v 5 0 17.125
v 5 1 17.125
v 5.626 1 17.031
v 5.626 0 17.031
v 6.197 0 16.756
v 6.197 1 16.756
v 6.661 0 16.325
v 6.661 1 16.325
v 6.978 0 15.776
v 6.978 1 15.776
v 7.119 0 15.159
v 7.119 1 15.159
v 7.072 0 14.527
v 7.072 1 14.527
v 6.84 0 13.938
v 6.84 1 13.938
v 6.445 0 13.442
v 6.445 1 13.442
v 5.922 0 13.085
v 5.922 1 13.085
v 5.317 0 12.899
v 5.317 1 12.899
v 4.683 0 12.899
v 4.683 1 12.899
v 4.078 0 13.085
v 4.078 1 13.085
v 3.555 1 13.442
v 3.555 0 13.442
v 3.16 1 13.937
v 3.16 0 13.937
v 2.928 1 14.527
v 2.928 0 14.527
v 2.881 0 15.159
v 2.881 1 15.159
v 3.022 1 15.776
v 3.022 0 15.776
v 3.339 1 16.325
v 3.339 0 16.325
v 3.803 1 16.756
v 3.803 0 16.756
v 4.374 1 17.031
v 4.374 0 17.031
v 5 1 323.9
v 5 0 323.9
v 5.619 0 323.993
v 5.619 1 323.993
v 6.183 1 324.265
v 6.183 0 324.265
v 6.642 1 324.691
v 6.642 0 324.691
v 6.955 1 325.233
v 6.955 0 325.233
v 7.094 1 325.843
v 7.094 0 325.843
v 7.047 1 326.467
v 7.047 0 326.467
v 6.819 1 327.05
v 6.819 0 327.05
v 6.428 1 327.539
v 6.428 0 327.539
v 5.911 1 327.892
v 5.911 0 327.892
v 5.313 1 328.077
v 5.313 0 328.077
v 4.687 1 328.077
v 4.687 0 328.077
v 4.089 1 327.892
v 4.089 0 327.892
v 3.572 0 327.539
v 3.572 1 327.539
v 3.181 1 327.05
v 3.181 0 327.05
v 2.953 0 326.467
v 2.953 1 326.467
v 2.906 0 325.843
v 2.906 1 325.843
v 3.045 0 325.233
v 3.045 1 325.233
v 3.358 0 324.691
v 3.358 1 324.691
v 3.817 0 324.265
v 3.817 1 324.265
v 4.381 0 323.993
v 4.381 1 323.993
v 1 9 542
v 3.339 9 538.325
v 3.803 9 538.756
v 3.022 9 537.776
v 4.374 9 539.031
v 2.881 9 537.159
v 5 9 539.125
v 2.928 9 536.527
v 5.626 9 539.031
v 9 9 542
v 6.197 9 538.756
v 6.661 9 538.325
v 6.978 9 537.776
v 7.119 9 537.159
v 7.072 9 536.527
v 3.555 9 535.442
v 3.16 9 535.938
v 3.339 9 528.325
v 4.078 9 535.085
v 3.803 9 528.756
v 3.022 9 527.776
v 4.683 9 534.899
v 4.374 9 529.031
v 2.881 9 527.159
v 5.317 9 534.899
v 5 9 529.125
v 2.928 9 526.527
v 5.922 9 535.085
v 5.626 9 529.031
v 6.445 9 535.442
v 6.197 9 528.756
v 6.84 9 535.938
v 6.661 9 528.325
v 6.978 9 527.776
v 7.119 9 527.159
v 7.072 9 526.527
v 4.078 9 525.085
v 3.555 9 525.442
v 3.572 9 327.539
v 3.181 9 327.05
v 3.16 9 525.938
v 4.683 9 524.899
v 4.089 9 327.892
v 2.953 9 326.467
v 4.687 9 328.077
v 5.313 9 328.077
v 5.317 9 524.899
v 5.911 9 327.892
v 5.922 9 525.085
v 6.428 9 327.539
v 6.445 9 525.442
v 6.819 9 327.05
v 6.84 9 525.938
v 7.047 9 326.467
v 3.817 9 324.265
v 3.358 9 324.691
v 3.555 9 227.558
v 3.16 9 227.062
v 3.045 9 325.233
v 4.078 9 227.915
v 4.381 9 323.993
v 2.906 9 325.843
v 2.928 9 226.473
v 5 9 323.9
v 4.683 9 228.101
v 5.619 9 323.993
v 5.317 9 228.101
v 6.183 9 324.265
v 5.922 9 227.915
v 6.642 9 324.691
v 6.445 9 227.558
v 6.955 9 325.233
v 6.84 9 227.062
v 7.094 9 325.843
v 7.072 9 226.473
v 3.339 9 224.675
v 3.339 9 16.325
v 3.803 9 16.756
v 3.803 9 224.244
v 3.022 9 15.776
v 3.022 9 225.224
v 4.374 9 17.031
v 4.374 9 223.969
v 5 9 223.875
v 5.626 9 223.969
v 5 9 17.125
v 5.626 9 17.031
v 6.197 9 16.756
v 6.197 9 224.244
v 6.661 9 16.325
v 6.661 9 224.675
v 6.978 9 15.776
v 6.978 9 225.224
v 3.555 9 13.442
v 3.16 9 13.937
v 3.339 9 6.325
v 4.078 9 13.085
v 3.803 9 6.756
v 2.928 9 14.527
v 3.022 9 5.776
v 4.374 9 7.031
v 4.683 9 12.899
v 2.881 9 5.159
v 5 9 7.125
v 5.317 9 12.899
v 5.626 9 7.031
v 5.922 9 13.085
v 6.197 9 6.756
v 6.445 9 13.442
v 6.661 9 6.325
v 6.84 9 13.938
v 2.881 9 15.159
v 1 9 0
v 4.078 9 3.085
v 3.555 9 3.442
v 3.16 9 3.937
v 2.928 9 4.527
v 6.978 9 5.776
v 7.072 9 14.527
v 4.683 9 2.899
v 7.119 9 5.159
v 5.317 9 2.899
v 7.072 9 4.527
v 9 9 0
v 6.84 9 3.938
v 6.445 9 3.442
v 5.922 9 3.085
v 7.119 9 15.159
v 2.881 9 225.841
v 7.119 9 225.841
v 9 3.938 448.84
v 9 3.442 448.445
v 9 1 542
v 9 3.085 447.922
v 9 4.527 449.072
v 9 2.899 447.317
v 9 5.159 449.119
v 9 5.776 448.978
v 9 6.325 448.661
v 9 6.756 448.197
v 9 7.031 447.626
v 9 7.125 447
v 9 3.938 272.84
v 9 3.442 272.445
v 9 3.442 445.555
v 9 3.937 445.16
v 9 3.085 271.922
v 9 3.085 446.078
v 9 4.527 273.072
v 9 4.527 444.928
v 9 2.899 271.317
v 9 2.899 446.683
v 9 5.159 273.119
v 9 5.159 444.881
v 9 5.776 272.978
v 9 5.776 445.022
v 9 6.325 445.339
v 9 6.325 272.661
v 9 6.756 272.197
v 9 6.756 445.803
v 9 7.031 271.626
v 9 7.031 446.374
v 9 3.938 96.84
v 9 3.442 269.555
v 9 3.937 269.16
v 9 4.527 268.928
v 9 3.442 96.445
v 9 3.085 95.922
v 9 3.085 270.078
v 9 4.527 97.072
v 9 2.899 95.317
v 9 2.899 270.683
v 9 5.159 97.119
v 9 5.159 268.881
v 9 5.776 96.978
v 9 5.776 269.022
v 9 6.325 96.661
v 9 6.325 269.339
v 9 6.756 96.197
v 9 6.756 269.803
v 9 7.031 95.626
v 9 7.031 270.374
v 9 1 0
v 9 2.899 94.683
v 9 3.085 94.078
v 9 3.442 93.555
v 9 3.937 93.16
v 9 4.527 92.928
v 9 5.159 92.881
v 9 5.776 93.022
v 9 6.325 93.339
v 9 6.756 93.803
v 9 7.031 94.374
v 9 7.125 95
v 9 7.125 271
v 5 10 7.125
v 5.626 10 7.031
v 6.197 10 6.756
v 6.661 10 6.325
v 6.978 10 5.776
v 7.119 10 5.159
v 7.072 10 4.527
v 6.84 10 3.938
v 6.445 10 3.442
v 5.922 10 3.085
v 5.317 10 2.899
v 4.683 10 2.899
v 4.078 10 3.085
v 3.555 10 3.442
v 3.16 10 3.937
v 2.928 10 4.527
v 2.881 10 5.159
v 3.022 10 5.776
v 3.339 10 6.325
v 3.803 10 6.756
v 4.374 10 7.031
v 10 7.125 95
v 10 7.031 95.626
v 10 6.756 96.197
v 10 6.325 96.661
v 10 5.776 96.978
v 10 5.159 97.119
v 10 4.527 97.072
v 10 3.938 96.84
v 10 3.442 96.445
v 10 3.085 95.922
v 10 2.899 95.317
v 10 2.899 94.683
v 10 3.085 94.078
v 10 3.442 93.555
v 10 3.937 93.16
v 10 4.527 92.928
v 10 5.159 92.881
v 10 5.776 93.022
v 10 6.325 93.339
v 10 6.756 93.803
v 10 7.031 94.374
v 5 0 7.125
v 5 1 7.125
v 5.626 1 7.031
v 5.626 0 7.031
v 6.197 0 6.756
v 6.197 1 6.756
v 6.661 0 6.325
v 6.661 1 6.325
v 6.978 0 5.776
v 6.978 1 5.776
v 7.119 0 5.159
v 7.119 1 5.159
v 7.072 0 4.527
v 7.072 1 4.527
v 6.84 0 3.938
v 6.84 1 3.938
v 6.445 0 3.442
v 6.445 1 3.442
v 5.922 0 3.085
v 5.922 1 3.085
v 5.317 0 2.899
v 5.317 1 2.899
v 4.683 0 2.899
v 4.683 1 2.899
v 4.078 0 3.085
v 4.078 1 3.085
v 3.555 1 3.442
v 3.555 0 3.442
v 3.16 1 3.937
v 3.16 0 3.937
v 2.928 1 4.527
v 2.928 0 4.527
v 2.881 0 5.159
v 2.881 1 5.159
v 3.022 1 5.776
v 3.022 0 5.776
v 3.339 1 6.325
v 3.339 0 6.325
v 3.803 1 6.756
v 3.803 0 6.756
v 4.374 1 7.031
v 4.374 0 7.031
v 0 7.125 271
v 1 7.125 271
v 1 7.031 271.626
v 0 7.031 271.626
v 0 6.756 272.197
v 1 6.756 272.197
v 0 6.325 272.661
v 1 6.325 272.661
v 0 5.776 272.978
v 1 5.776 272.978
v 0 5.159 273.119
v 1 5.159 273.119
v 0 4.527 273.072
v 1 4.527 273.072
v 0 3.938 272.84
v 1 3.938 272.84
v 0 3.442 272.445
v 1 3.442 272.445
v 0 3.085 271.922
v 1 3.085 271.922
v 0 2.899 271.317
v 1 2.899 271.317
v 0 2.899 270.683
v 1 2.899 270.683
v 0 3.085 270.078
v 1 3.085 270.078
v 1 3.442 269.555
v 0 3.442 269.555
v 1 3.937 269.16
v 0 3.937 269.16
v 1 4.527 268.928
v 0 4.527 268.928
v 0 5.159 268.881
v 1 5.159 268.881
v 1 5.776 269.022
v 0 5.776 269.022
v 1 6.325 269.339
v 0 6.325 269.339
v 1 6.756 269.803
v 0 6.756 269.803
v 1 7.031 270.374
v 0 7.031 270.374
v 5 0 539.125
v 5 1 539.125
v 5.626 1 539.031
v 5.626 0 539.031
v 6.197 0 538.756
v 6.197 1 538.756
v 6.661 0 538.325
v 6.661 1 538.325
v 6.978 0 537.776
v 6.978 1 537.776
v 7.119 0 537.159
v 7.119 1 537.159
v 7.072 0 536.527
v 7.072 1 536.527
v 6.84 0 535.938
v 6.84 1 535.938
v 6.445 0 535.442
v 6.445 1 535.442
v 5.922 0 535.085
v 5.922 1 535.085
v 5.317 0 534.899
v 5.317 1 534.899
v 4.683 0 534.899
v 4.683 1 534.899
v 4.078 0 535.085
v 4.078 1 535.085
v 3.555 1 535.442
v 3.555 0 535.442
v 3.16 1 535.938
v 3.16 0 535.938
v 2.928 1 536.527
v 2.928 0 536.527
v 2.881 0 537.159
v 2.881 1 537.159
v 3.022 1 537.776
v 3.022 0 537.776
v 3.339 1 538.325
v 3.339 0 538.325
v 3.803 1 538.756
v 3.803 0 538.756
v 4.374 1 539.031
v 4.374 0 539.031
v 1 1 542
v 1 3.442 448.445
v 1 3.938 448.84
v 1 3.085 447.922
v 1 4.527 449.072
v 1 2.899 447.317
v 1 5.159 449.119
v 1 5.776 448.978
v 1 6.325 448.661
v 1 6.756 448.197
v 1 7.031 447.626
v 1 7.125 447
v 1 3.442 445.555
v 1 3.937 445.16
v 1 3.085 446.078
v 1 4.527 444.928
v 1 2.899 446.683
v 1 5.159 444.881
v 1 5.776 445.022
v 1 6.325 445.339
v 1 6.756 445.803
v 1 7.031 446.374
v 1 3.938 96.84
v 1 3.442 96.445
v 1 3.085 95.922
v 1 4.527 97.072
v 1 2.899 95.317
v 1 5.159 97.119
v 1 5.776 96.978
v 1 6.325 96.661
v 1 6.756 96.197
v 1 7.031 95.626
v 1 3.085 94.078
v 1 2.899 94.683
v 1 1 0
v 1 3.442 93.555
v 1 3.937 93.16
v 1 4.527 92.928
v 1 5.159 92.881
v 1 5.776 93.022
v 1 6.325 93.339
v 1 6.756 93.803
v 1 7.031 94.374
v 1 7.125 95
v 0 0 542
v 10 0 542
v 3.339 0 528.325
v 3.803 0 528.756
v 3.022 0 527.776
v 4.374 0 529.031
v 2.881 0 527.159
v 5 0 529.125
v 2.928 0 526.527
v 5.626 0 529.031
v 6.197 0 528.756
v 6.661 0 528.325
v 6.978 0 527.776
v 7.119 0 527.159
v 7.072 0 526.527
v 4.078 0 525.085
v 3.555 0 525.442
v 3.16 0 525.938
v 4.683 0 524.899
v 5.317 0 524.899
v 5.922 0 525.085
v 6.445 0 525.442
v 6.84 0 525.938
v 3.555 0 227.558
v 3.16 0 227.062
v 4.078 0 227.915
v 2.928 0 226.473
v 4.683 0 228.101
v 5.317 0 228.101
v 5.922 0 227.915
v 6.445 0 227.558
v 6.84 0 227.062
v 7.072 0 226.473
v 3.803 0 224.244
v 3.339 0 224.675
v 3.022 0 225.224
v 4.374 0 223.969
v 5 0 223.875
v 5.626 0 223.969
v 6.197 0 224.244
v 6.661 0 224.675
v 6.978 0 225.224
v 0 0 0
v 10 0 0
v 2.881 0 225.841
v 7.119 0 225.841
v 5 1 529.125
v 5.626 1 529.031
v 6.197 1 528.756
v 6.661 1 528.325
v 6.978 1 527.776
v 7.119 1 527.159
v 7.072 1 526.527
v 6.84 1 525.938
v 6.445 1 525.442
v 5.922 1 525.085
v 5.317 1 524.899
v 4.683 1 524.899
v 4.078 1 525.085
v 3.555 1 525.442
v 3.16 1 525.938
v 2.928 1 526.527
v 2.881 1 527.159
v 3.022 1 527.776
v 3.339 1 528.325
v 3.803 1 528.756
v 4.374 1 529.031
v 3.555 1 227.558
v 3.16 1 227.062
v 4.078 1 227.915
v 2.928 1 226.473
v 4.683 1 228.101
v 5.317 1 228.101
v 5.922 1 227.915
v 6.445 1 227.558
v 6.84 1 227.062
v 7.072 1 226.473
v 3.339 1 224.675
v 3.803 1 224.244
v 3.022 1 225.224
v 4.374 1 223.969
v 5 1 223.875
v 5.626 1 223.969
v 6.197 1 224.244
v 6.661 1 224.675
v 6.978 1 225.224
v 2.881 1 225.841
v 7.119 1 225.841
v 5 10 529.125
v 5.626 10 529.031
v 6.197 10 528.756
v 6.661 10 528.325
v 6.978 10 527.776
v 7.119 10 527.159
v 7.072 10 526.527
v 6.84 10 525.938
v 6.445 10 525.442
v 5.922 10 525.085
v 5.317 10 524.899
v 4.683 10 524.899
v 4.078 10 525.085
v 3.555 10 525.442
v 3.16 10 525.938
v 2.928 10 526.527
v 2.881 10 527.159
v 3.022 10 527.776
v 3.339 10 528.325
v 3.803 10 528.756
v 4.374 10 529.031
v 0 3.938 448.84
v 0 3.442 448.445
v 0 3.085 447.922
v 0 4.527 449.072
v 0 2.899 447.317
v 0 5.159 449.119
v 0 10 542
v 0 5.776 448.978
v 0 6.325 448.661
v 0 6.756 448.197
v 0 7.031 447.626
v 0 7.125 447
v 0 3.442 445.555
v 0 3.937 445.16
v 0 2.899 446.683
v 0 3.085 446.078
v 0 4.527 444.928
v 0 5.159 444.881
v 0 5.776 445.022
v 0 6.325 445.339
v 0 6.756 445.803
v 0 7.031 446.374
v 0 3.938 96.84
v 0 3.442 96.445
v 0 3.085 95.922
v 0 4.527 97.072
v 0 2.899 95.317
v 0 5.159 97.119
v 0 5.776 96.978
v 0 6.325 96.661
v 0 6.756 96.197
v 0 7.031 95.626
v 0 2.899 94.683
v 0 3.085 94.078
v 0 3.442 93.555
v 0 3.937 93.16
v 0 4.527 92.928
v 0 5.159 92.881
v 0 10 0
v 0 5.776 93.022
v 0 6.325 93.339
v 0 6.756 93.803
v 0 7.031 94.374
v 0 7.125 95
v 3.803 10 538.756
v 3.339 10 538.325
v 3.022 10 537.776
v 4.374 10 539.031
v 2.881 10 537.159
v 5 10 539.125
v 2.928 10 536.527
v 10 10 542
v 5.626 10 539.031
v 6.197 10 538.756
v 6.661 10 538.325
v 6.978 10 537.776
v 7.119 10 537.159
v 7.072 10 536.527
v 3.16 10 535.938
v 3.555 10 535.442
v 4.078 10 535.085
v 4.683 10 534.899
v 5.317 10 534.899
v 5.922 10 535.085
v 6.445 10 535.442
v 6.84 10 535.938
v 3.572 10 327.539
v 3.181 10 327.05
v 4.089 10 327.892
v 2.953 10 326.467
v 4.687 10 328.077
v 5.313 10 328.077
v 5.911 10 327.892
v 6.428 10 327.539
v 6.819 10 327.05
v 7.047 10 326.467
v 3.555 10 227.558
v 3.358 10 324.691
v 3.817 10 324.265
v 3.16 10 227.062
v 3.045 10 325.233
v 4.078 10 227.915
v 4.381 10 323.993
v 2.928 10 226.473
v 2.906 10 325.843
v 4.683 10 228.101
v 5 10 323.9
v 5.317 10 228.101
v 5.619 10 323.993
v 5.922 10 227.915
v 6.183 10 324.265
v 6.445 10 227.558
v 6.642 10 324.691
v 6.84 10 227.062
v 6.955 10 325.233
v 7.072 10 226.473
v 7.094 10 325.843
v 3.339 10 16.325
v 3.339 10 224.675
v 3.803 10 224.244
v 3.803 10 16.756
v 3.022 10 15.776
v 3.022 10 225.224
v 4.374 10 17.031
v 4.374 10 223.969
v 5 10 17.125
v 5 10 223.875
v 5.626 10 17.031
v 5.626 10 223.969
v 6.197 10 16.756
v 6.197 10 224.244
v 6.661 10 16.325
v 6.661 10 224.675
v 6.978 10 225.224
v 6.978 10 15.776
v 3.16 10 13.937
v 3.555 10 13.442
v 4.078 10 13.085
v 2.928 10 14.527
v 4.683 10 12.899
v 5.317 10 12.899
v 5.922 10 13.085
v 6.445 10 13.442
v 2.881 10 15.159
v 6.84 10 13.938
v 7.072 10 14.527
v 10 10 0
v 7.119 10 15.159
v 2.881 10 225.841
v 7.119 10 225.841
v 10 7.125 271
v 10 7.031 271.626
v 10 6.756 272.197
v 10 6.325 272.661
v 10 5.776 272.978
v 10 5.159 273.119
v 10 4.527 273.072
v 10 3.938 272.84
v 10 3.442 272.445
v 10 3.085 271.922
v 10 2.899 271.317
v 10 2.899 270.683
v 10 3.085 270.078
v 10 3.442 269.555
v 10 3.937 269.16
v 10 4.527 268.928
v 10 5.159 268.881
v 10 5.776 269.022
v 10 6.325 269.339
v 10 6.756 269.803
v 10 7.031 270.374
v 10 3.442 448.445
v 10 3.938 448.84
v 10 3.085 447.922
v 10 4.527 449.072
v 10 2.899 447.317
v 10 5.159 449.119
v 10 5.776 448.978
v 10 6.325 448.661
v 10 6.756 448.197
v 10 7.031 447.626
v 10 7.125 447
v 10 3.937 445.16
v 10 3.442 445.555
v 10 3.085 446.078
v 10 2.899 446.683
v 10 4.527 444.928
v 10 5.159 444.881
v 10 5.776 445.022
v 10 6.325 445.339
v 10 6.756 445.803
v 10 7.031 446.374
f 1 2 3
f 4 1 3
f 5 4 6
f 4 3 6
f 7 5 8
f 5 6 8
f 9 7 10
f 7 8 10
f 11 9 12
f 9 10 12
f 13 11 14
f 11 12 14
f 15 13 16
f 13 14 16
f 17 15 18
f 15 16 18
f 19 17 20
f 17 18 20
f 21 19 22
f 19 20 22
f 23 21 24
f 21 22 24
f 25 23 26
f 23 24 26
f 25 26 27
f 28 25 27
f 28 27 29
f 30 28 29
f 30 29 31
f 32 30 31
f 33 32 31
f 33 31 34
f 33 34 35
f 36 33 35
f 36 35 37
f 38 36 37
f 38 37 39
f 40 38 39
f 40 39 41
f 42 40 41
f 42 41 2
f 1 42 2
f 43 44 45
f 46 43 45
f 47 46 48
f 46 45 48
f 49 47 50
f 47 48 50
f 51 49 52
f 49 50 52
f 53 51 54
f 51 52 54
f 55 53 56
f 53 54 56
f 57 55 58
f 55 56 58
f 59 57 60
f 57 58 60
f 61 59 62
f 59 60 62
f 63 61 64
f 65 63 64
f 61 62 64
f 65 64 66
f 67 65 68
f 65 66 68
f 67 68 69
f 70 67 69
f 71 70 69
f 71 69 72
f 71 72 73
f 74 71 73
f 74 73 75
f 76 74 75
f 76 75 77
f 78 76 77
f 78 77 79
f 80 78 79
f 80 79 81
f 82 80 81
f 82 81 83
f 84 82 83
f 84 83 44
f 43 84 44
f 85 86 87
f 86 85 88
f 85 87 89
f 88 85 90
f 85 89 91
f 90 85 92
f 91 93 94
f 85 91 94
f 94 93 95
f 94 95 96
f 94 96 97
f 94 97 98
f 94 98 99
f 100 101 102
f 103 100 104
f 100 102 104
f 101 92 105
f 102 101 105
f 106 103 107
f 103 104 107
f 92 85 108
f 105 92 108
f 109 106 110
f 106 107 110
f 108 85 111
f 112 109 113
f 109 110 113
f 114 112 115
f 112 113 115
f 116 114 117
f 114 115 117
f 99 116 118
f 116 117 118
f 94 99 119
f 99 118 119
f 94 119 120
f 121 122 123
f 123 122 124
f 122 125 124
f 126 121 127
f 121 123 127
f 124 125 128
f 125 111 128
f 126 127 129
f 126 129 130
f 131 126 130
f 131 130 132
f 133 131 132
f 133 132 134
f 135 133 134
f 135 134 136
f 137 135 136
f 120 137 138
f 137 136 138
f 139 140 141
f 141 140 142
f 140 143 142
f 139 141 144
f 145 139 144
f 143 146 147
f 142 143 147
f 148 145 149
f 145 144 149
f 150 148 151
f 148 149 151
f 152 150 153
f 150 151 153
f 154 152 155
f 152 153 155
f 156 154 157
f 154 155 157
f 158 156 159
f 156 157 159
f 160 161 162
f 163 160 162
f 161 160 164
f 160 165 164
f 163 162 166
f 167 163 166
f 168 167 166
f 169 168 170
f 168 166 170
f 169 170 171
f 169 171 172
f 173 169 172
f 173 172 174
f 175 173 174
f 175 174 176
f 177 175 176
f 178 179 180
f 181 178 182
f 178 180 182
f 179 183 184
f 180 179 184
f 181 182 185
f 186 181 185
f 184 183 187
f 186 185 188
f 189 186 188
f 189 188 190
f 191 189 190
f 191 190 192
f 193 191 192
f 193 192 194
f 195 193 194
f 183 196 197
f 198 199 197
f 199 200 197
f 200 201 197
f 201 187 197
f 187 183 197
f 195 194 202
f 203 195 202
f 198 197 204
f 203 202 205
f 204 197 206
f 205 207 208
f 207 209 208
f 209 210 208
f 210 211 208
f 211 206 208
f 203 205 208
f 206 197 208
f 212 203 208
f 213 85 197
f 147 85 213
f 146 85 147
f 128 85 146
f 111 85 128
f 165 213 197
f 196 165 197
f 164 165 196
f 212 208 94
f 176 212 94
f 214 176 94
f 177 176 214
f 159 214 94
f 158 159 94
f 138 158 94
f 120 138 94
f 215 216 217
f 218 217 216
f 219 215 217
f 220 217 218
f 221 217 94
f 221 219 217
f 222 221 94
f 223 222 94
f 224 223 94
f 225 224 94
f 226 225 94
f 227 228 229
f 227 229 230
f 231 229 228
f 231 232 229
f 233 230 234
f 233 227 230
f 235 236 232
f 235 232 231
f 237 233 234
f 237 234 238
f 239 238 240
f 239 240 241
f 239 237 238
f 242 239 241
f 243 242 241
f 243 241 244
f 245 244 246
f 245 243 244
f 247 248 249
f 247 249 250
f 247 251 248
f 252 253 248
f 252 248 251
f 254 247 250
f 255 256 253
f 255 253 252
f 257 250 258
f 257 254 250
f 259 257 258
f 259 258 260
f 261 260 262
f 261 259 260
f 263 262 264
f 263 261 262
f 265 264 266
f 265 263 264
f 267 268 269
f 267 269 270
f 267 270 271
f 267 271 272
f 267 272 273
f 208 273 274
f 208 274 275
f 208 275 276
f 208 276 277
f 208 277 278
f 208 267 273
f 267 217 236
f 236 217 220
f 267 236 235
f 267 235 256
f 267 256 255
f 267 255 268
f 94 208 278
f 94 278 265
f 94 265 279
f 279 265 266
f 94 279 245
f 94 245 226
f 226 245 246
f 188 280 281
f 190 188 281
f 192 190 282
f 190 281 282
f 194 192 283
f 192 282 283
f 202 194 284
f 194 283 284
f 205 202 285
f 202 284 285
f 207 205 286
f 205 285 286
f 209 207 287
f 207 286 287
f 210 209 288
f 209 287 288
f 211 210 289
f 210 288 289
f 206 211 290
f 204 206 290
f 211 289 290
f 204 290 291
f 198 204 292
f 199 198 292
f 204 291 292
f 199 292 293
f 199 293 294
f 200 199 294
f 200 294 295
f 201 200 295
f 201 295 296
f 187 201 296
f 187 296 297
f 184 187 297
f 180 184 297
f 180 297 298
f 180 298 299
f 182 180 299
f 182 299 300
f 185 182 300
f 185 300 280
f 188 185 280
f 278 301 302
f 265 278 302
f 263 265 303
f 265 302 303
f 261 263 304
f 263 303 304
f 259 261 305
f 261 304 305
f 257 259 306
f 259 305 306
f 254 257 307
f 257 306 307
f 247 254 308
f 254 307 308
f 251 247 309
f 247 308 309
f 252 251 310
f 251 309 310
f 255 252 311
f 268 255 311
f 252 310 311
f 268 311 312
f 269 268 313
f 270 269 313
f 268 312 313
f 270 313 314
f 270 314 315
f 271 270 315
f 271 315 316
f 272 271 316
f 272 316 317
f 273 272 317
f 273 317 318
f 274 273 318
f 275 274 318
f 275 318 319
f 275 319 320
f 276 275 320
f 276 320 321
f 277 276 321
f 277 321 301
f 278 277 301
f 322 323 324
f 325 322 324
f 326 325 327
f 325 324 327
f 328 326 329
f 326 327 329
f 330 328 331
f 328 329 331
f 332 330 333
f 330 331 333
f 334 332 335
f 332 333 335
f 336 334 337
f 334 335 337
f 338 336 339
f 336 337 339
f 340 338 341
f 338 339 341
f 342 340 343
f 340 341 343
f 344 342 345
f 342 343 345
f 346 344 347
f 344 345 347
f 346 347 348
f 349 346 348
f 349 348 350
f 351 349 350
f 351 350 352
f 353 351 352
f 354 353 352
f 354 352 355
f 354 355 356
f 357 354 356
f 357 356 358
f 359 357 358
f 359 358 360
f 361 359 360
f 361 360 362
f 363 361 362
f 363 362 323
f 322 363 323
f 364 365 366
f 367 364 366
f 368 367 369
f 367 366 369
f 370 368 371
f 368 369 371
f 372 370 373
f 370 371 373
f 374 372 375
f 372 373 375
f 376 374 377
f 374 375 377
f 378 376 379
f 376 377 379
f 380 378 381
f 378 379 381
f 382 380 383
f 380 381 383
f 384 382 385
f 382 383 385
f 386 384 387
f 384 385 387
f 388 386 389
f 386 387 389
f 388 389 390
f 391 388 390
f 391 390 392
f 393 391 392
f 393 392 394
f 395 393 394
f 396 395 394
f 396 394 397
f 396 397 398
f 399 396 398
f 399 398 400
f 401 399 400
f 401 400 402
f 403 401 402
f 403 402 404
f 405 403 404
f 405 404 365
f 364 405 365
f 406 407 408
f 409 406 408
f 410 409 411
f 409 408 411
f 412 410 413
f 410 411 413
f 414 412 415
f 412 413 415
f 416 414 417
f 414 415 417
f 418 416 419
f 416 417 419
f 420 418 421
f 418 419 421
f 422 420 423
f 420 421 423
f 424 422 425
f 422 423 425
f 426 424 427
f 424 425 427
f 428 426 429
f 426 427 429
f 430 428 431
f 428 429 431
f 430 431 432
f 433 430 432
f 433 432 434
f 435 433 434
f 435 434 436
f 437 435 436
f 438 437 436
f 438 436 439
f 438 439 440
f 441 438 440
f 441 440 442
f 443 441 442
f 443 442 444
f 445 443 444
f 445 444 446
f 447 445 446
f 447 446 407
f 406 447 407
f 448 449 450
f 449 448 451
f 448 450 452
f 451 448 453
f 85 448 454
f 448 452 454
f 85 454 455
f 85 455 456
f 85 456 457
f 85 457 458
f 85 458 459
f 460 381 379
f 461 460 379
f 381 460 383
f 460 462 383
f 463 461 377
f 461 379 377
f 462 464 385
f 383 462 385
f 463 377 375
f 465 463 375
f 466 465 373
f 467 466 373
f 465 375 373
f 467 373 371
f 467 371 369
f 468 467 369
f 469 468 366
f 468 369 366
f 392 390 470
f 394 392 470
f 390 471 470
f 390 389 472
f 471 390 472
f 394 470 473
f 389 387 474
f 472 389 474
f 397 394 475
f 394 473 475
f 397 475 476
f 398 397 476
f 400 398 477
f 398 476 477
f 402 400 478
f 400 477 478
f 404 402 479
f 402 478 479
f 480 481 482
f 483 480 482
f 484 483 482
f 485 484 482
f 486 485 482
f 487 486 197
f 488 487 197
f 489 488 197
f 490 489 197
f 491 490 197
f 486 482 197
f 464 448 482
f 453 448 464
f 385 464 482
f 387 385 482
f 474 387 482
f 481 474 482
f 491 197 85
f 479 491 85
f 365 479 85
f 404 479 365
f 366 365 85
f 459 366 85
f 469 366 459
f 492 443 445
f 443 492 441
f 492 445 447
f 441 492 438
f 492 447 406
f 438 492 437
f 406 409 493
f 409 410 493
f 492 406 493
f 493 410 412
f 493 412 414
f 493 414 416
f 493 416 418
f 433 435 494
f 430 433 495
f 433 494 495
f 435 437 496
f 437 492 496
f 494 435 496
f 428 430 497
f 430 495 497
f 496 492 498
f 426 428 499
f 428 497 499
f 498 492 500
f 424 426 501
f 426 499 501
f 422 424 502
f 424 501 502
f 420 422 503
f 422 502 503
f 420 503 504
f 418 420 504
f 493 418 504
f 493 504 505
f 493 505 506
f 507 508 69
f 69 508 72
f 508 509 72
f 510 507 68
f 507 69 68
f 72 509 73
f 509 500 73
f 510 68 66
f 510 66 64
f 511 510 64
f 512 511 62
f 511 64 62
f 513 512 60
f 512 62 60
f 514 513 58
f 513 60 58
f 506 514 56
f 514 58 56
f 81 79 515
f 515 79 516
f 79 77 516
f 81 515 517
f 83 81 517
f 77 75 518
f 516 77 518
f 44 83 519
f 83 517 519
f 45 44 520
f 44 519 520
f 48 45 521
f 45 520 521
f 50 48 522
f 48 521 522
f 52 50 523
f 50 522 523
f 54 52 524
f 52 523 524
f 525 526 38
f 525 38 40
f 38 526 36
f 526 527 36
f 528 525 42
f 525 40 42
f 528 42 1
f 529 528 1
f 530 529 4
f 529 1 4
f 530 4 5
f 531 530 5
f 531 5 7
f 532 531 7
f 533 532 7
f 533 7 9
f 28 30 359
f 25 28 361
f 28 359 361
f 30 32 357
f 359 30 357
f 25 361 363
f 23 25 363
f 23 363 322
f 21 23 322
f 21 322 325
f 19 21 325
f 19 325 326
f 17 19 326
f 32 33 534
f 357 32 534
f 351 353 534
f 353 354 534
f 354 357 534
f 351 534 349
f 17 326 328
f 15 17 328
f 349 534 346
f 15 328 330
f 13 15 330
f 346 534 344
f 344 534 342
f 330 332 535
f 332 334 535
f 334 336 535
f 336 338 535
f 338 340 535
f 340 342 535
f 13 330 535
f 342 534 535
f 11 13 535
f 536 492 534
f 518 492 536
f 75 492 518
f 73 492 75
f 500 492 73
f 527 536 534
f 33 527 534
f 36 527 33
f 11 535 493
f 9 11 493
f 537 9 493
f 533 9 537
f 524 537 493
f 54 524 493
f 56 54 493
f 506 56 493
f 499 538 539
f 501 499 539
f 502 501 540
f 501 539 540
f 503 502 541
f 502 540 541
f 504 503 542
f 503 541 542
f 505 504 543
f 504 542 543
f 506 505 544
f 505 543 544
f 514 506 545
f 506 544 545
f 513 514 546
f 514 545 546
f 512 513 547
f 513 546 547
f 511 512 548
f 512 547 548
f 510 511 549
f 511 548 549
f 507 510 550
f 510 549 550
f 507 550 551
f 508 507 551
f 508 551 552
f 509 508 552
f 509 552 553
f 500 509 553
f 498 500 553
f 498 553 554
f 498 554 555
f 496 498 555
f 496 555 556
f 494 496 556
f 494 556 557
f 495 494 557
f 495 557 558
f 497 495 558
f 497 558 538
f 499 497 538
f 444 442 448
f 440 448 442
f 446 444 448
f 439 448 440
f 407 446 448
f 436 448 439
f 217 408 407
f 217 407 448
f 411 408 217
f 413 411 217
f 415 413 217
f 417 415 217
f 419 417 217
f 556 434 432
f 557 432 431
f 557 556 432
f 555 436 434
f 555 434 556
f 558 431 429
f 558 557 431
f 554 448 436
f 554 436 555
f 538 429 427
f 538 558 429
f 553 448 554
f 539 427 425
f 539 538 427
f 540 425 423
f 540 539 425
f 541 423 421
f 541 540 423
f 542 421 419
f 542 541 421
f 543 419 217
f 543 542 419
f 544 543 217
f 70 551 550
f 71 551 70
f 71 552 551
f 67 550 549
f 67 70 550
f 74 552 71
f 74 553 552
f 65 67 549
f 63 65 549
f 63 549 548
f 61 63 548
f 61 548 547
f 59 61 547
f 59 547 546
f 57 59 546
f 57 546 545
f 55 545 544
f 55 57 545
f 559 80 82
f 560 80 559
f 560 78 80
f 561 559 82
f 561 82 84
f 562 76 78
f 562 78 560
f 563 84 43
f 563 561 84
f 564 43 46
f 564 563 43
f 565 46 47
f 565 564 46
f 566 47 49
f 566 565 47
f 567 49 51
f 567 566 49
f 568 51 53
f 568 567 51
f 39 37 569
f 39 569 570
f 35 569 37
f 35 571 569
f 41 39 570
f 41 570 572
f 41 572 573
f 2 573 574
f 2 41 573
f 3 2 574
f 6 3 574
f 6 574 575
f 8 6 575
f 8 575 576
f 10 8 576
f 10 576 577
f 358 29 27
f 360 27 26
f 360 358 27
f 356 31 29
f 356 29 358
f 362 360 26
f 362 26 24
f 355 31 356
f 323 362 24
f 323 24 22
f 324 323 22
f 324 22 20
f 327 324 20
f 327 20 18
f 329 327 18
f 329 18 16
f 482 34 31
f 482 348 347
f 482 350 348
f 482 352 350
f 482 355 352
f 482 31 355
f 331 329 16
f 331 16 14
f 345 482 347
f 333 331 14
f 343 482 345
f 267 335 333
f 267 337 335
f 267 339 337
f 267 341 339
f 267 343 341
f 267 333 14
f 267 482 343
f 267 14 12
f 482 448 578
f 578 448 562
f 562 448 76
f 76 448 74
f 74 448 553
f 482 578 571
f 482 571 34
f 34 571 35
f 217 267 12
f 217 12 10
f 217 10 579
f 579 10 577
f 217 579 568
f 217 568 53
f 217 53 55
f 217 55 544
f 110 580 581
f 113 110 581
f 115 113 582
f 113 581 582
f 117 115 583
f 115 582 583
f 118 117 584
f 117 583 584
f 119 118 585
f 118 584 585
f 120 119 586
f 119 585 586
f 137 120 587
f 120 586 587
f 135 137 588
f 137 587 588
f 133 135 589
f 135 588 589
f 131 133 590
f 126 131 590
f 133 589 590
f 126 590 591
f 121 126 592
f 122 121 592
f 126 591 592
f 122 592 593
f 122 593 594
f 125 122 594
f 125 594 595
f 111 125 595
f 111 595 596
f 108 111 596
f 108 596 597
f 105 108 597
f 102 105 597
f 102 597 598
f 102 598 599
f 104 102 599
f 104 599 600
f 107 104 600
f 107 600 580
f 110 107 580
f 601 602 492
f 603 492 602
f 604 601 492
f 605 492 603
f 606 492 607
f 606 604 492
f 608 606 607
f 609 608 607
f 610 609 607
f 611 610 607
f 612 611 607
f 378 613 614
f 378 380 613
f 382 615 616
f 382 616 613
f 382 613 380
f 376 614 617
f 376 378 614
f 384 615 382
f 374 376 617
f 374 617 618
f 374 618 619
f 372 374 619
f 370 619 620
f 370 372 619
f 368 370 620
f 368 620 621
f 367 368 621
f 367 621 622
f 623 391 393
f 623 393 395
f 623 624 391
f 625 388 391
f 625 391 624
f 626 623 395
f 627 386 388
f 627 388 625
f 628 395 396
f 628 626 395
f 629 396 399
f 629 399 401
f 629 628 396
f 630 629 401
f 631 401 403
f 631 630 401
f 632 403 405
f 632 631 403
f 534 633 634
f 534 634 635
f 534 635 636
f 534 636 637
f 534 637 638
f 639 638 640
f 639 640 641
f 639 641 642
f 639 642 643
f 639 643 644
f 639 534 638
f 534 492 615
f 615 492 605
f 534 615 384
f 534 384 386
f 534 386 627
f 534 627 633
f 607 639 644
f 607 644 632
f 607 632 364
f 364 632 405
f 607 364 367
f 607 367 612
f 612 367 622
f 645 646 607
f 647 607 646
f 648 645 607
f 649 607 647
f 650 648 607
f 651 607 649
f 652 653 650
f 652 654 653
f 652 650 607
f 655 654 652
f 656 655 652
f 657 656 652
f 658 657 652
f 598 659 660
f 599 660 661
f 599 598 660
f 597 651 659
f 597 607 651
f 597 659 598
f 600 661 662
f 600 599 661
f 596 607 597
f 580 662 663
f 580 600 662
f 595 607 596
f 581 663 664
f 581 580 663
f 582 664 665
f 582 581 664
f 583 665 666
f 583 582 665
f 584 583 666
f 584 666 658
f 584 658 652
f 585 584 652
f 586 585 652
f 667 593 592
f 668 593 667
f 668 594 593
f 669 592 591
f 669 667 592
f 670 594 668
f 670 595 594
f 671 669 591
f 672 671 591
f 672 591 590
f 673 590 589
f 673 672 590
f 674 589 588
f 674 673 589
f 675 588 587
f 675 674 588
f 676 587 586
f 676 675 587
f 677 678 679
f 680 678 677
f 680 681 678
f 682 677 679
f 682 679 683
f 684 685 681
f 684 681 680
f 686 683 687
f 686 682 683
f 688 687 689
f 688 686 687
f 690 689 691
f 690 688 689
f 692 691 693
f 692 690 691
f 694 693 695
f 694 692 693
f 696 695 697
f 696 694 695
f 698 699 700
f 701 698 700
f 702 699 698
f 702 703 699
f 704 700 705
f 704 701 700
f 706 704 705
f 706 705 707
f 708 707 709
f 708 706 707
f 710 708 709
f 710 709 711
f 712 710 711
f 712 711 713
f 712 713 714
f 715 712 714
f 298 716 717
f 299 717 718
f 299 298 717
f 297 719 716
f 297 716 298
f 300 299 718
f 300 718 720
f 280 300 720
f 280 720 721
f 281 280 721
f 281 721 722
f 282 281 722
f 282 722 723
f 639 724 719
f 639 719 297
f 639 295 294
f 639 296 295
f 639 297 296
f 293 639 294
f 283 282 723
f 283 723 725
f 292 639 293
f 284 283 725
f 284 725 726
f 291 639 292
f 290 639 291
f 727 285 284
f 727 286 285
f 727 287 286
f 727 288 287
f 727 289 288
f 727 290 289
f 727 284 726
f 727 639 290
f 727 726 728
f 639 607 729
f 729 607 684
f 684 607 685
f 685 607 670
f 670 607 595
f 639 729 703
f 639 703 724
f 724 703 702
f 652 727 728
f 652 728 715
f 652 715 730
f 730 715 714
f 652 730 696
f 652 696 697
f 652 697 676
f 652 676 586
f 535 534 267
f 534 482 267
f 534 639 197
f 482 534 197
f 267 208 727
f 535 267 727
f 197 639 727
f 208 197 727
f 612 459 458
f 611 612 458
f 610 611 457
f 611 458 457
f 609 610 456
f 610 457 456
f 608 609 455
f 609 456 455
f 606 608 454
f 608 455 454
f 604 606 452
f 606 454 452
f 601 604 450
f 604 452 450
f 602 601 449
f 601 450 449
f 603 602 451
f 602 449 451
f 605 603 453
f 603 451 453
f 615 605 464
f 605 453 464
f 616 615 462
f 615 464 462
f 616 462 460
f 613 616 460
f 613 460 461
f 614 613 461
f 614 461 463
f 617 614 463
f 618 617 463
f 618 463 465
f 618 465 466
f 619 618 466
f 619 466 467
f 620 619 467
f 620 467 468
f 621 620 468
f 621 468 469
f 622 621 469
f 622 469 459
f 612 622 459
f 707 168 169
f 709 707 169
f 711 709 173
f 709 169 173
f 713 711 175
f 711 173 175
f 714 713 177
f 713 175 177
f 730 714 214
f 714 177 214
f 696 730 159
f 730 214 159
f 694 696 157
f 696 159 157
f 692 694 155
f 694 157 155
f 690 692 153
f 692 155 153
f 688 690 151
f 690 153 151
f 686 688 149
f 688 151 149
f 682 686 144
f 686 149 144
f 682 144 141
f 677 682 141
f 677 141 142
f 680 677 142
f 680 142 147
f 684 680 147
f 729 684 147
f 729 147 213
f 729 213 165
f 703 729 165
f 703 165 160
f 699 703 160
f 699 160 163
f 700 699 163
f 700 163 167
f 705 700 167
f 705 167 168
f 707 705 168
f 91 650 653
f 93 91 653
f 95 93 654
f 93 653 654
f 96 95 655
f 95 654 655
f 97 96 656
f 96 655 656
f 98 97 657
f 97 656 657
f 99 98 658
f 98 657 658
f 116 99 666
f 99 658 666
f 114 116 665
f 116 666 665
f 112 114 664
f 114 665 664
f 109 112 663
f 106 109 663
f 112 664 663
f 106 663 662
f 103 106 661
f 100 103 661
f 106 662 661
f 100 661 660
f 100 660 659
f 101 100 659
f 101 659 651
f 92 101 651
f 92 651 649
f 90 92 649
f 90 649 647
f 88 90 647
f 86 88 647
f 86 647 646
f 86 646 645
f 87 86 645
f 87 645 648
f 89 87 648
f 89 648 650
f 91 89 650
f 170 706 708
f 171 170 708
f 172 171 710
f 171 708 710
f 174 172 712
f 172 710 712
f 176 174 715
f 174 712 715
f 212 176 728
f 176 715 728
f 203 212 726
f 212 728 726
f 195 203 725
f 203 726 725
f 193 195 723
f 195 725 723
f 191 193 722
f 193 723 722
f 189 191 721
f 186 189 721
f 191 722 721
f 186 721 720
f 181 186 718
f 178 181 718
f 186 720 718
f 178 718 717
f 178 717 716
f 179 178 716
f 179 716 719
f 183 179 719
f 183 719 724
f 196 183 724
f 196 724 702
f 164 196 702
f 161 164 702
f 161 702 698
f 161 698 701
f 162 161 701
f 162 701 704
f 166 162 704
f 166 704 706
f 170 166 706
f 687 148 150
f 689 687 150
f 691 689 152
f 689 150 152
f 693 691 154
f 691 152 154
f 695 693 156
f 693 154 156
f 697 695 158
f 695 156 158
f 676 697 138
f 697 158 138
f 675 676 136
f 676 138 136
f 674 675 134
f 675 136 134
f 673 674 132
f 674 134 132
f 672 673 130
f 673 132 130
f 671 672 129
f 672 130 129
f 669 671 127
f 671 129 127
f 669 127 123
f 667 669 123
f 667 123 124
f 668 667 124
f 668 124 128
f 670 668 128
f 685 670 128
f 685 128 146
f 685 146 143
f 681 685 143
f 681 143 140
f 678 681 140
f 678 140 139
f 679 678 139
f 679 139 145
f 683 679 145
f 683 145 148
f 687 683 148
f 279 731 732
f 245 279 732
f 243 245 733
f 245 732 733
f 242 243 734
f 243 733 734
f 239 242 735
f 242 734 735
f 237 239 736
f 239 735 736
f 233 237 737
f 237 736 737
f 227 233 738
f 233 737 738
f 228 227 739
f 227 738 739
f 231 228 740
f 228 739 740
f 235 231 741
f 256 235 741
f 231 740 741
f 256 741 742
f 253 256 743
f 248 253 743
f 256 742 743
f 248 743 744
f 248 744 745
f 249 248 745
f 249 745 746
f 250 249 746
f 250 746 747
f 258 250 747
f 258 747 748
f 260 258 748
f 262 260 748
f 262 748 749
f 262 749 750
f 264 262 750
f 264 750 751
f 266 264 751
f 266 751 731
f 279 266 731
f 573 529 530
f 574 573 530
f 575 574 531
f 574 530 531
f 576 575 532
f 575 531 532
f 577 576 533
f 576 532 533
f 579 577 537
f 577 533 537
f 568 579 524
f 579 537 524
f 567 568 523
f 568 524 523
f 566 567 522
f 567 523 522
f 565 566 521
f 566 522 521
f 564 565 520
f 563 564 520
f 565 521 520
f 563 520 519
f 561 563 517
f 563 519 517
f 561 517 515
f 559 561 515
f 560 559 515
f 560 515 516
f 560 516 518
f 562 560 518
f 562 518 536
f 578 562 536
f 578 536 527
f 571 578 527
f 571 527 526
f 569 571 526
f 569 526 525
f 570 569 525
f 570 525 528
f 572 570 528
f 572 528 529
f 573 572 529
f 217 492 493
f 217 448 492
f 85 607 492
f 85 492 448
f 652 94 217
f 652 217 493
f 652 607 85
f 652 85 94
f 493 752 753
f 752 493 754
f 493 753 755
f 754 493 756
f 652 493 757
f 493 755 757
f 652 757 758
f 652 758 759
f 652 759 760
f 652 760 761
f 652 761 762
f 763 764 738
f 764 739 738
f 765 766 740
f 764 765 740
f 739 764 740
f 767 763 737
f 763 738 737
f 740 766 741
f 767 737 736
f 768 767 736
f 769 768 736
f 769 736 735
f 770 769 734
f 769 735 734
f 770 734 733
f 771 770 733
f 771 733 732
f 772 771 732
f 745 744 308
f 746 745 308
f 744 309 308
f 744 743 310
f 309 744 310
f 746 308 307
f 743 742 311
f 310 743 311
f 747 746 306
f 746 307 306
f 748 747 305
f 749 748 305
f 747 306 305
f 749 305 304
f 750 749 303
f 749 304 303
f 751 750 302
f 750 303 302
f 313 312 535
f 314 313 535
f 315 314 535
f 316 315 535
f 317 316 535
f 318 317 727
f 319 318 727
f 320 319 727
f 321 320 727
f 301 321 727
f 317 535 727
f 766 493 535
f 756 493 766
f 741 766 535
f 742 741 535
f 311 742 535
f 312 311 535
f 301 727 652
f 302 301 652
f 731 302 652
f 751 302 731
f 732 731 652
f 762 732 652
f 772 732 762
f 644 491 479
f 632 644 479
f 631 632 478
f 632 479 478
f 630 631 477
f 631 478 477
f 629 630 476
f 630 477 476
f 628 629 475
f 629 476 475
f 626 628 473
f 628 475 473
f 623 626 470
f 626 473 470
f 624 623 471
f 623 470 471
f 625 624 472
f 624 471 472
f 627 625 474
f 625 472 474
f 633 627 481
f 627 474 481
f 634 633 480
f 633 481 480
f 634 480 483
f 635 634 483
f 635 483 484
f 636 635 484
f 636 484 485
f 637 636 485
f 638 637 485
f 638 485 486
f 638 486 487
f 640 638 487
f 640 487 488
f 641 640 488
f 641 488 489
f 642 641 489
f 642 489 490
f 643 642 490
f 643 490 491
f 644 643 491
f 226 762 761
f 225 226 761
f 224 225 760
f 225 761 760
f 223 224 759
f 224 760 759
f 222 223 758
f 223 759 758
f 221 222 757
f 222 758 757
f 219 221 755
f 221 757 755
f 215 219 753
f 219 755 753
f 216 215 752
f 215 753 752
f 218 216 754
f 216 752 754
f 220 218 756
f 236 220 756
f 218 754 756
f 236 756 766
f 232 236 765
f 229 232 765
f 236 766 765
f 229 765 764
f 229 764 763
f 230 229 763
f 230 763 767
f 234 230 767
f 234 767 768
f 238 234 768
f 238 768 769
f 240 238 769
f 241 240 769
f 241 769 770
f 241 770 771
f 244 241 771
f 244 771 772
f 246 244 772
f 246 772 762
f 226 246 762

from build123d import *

# Parameters (mm, degrees)
SKETCH1_W           = 10
SKETCH1_H           = 10
SKETCH1_W_2         = 8
SKETCH1_H_2         = 8
BOSS_EXTRUDE1_DEPTH = 542
SKETCH2_R           = 2.125
CUT_EXTRUDE1_DEPTH  = 116
SKETCH3_R           = 2.1
SKETCH3_R_2         = 2.125
CUT_EXTRUDE2_DEPTH  = 10
SKETCH5_R           = 2.125
CUT_EXTRUDE3_DEPTH  = 10


with BuildPart() as part:
    # Sketch1 → Boss-Extrude1 (new body)
    with BuildSketch(Plane.XY):
        with Locations((5, 5)):
            Rectangle(SKETCH1_W, SKETCH1_H)
        with Locations((5, 5)):
            Rectangle(SKETCH1_W_2, SKETCH1_H_2, mode=Mode.SUBTRACT)
    extrude(amount=BOSS_EXTRUDE1_DEPTH)

    # Sketch2 → Cut-Extrude1 (cut)
    with BuildSketch(Plane(origin=(0, 10, 0), x_dir=(1, 0, 0), z_dir=(0, 1, 0))):
        with Locations(Location((5, -5, 0), (0, 0, 270))):
            Circle(SKETCH2_R)
        with Locations(Location((5, -15, 0), (0, 0, 270))):
            Circle(SKETCH2_R)
        with Locations(Location((5, -527, 0), (0, 0, 270))):
            Circle(SKETCH2_R)
        with Locations(Location((5, -537, 0), (0, 0, 270))):
            Circle(SKETCH2_R)
    extrude(amount=-CUT_EXTRUDE1_DEPTH, mode=Mode.SUBTRACT)

    # Sketch3 → Cut-Extrude2 (cut)
    with BuildSketch(Plane.XZ):
        with Locations(Location((5, 326, 0), (0, 0, 270))):
            Circle(SKETCH3_R)
        with Locations(Location((5, 226, 0), (0, 0, 270))):
            Circle(SKETCH3_R_2)
    extrude(amount=-CUT_EXTRUDE2_DEPTH, mode=Mode.SUBTRACT)

    # Sketch5 → Cut-Extrude3 (cut)
    with BuildSketch(Plane(origin=(10, 0, 0), x_dir=(0, 0, -1), z_dir=(1, 0, 0))):
        with Locations(Location((-447, 5, 0), (0, 0, 90))):
            Circle(SKETCH5_R)
        with Locations(Location((-95, 5, 0), (0, 0, 90))):
            Circle(SKETCH5_R)
        with Locations(Location((-271, 5, 0), (0, 0, 90))):
            Circle(SKETCH5_R)
    extrude(amount=-CUT_EXTRUDE3_DEPTH, mode=Mode.SUBTRACT)


solid = part.part
